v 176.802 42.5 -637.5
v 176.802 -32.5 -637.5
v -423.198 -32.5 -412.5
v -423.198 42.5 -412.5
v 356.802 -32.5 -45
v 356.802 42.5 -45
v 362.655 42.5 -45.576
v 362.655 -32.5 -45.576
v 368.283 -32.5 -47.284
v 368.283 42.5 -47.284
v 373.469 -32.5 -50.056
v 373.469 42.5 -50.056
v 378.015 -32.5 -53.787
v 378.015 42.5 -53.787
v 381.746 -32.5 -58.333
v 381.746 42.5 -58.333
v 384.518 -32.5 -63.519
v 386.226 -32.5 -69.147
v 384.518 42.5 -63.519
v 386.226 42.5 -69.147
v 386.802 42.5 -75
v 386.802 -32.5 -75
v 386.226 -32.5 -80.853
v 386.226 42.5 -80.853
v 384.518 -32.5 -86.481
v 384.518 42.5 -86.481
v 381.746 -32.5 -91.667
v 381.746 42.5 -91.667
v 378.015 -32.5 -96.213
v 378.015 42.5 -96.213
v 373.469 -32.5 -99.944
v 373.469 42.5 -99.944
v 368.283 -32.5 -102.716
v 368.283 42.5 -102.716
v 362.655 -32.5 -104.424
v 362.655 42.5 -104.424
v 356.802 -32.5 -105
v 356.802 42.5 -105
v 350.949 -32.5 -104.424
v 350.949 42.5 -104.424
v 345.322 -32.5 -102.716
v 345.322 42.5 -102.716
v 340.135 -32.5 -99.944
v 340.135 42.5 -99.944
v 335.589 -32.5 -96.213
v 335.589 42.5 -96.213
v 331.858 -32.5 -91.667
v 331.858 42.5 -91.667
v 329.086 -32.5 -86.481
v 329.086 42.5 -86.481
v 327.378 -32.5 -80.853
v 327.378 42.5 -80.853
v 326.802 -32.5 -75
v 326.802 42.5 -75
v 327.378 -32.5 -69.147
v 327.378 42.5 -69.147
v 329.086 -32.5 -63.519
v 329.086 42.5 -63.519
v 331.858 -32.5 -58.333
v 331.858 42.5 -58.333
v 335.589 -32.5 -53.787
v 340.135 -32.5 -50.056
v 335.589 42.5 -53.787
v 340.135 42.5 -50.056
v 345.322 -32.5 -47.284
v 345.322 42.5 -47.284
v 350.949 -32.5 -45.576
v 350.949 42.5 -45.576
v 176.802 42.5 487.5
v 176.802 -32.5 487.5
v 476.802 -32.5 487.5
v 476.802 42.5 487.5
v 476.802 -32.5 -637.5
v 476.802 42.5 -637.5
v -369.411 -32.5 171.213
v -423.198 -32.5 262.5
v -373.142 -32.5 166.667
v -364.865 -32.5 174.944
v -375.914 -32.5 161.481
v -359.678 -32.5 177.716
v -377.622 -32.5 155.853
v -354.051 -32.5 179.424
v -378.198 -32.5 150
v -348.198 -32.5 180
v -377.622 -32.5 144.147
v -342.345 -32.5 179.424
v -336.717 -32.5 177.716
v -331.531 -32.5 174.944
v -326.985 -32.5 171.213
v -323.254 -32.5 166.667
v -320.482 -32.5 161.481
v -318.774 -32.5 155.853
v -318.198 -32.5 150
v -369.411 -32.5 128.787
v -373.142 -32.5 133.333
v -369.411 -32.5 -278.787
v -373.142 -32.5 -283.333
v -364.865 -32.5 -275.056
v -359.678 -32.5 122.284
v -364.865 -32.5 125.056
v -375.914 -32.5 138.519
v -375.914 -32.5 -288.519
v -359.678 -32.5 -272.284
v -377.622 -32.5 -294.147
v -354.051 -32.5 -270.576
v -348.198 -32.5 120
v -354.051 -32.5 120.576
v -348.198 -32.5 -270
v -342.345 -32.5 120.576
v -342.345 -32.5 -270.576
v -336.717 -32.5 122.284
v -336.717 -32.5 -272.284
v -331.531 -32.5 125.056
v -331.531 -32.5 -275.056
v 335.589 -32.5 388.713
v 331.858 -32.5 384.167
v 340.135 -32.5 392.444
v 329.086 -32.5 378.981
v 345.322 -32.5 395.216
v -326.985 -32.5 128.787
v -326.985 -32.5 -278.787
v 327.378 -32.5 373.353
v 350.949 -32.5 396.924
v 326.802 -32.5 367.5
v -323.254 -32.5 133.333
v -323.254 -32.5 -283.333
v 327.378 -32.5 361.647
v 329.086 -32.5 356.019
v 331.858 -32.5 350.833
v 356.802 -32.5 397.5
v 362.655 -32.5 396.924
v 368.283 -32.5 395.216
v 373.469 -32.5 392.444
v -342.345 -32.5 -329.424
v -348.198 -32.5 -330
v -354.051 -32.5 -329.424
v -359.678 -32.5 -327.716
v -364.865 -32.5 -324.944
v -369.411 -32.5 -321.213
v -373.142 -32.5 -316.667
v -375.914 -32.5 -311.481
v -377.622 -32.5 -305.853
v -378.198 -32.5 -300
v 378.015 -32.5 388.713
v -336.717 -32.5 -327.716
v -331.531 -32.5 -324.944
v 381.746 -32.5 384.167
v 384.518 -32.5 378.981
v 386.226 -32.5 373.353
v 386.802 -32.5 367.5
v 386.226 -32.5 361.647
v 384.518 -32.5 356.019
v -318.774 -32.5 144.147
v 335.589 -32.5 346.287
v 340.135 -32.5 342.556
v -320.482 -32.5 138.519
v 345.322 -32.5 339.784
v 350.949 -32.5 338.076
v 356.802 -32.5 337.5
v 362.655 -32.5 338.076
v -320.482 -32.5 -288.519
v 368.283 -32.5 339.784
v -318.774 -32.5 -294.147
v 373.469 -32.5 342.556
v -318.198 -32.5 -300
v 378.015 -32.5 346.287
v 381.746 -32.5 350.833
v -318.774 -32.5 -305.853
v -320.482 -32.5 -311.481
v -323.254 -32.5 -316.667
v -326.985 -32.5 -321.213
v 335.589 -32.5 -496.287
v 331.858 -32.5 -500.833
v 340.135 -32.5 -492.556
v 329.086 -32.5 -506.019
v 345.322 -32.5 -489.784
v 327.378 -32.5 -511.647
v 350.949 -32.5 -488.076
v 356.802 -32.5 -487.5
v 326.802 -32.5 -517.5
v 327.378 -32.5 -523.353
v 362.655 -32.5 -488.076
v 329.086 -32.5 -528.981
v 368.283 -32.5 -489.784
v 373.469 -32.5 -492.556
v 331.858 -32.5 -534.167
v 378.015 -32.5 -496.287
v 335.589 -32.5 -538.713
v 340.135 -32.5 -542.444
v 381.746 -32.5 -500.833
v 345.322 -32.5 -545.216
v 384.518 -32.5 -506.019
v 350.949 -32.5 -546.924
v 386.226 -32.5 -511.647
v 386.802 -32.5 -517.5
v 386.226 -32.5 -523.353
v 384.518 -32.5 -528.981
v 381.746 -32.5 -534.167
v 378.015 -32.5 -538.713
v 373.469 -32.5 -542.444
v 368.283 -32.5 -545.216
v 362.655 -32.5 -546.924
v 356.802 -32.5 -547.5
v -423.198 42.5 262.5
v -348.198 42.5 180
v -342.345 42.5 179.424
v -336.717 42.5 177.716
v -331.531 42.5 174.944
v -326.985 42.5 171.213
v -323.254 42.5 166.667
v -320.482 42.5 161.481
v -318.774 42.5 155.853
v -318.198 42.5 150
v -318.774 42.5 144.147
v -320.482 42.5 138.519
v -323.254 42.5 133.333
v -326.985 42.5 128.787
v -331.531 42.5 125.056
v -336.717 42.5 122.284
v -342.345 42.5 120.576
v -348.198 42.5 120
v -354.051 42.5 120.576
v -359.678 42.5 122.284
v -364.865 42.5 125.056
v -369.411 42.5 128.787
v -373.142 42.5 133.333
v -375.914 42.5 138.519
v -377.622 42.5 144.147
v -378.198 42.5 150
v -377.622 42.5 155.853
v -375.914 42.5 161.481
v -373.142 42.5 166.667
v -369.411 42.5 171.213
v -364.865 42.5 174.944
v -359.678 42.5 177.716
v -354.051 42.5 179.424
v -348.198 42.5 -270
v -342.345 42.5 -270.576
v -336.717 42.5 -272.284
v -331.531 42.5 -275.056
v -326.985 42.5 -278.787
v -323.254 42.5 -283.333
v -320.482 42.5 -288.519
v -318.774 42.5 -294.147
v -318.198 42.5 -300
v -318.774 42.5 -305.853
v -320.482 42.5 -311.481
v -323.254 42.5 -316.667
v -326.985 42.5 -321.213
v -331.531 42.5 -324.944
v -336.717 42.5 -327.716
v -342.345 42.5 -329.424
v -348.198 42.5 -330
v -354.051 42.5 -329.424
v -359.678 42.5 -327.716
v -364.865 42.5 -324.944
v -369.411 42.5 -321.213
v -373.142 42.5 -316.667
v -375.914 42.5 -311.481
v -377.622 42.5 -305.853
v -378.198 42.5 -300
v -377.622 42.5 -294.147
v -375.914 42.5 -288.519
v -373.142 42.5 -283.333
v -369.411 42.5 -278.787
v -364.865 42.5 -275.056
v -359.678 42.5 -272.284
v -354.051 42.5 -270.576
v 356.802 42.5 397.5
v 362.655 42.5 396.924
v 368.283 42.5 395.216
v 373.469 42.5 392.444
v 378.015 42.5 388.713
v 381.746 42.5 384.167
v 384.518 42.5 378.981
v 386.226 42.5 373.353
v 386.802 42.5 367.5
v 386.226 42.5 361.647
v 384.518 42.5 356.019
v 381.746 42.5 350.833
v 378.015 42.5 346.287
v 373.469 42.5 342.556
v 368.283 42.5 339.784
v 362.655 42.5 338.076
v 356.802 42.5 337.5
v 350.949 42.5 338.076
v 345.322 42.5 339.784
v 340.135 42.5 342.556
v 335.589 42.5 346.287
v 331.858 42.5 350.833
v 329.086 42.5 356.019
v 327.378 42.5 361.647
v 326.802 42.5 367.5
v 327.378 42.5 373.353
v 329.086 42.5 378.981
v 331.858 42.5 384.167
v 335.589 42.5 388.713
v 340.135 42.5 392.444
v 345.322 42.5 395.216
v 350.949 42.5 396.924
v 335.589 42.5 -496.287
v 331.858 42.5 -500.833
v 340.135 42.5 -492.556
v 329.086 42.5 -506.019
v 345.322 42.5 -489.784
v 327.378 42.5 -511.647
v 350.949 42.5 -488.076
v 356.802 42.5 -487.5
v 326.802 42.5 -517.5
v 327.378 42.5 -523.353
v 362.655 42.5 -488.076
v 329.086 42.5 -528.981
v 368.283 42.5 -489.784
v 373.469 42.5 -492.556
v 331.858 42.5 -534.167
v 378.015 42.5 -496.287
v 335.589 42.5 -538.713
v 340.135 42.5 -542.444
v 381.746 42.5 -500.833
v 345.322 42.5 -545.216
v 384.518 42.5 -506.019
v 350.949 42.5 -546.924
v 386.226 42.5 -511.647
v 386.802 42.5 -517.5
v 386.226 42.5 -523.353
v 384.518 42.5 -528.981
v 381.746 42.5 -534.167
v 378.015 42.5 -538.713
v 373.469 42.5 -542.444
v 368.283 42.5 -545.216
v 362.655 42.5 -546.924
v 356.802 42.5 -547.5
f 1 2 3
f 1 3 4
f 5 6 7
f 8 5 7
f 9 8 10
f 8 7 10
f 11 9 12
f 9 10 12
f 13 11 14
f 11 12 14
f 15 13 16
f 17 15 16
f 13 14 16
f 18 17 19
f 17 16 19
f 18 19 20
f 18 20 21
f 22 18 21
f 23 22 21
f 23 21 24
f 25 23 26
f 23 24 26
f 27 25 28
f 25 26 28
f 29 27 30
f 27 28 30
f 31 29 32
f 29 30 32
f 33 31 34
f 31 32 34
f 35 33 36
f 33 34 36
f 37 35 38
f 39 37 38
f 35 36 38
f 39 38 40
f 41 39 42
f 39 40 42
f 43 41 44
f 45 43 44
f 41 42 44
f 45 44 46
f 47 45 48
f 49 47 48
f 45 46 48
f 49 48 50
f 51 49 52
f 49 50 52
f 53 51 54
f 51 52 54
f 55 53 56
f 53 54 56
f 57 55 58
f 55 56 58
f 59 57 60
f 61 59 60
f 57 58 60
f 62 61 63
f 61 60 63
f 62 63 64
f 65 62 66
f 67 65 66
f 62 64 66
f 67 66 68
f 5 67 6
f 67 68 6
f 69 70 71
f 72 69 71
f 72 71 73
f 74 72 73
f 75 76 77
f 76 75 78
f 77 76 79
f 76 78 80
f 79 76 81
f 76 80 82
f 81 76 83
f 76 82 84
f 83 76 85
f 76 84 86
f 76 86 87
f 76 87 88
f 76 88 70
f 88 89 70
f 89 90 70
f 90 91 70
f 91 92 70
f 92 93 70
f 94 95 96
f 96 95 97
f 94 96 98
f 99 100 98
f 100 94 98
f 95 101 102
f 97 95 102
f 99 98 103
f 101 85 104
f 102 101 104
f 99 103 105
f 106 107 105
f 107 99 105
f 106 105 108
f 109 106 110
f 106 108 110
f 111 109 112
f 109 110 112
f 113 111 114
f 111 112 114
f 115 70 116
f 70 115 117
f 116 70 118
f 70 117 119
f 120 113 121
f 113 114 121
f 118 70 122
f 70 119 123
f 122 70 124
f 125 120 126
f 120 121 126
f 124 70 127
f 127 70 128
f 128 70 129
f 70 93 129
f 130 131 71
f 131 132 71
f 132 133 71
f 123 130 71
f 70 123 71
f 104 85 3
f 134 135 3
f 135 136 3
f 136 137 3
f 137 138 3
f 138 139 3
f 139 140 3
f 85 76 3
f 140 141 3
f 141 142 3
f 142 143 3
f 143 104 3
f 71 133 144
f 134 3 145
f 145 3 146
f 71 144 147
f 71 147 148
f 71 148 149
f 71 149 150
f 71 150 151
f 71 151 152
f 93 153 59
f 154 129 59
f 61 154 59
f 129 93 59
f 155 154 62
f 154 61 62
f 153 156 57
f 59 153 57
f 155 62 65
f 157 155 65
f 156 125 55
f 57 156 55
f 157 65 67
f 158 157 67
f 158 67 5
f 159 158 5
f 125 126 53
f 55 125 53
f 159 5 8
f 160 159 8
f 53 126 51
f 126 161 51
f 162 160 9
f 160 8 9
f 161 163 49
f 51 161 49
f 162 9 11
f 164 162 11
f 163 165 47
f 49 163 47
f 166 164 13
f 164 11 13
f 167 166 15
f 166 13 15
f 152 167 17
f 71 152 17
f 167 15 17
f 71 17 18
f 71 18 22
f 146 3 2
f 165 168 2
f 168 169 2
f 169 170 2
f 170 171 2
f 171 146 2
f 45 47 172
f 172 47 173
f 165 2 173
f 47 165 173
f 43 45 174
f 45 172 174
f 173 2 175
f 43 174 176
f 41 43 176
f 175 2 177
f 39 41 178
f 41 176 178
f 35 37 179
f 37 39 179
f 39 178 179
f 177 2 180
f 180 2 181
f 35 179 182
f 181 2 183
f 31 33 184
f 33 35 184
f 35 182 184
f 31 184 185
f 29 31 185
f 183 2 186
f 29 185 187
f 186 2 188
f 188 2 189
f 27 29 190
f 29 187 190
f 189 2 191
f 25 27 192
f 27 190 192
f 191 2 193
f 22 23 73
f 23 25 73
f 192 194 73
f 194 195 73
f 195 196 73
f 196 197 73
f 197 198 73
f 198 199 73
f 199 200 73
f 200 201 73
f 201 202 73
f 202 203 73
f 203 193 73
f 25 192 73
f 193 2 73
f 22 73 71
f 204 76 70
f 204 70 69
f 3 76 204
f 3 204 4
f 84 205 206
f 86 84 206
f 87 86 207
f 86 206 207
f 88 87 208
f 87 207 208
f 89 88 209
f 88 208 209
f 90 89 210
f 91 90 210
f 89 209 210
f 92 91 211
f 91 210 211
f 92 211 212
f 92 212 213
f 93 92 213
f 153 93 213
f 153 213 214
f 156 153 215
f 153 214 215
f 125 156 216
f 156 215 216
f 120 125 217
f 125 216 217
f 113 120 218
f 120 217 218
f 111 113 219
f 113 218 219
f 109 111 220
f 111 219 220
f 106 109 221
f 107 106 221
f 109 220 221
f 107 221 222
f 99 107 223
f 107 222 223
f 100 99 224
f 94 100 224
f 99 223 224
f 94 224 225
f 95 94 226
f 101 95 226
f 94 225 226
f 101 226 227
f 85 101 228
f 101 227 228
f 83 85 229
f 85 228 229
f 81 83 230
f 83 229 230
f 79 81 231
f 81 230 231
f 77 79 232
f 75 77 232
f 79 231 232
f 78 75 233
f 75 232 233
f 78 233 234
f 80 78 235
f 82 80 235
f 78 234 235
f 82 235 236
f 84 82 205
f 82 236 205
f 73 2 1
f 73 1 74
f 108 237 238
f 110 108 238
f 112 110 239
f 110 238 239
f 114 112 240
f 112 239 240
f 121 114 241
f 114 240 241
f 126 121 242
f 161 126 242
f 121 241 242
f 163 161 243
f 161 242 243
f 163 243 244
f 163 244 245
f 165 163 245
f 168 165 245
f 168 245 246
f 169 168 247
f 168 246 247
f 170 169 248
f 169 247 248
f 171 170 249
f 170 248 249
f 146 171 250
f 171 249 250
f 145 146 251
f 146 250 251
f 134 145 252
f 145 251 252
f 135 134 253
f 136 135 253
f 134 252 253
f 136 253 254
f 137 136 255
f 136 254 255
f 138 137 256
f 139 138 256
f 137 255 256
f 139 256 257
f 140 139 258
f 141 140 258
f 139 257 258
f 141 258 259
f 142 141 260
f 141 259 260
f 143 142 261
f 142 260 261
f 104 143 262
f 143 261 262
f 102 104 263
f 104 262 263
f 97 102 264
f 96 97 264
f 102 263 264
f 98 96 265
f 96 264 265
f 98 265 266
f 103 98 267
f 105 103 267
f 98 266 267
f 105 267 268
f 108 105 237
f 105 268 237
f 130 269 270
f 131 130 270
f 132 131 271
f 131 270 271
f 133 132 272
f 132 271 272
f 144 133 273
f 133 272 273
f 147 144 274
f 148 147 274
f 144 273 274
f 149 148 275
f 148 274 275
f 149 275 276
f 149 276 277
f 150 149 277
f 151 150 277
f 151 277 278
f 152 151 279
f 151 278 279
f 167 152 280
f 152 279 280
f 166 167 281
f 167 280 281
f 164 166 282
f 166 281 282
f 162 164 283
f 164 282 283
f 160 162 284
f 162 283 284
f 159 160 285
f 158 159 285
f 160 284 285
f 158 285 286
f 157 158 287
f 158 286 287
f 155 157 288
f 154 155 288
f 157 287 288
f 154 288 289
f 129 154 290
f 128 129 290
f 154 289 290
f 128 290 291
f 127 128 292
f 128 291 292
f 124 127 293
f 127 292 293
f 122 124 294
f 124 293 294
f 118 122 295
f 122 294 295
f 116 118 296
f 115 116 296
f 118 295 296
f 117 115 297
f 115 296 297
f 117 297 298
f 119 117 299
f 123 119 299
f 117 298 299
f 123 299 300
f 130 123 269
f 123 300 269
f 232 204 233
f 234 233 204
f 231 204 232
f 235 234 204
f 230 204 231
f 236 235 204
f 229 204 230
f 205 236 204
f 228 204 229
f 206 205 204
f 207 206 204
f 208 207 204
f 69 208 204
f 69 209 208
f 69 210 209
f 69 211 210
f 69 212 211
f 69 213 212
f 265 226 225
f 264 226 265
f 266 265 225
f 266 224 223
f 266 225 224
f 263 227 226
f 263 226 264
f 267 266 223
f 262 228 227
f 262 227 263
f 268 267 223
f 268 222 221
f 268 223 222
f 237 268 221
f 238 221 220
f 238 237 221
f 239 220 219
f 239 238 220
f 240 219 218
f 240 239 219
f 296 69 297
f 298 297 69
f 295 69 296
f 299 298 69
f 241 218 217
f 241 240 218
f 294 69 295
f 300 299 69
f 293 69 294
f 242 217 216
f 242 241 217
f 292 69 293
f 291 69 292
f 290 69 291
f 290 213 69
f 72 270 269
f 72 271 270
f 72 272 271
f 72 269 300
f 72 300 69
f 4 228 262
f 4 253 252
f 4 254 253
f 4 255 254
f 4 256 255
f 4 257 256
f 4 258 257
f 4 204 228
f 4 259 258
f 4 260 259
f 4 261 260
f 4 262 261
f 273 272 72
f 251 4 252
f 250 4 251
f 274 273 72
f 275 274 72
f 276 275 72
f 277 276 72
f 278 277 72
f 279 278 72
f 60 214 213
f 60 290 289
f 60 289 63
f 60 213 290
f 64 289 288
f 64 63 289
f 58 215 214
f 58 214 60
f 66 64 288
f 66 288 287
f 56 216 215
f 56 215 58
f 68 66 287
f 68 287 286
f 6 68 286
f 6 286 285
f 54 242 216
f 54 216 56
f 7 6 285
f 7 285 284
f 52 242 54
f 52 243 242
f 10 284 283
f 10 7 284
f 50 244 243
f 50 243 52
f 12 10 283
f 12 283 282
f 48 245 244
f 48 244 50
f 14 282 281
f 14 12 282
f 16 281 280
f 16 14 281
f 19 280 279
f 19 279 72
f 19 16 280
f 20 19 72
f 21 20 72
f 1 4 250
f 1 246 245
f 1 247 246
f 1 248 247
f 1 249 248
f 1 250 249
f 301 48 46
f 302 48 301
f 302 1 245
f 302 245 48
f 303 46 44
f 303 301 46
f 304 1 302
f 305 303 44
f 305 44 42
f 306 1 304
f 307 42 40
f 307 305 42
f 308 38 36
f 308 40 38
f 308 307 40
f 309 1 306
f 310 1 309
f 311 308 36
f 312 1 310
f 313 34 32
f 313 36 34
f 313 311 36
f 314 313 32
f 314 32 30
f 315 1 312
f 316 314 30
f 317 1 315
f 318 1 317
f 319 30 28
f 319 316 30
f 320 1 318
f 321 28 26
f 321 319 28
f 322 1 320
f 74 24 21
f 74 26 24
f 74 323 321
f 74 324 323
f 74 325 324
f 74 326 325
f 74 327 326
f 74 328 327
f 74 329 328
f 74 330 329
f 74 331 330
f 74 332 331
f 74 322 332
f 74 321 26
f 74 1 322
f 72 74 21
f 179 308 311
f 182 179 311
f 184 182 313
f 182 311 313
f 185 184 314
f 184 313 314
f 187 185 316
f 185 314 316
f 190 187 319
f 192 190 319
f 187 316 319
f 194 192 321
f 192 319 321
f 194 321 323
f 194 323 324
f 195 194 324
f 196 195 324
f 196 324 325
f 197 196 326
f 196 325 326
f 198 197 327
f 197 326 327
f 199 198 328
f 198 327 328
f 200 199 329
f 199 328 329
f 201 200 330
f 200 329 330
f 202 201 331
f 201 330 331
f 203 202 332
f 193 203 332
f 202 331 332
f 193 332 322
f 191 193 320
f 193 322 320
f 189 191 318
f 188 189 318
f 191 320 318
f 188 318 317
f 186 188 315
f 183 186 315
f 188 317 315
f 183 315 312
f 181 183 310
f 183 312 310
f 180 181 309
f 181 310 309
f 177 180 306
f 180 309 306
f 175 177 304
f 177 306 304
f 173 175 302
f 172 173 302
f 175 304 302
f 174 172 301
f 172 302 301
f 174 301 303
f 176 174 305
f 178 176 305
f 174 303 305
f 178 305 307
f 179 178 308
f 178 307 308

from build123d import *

# Parameters (mm, degrees)
BOSS_EXTRUDE1_OUTLINE_W = 120
BOSS_EXTRUDE1_OUTLINE_H = 150
BOSS_EXTRUDE1_DEPTH     = 10
CHAMFER1_SIZE           = 30
CHAMFER1_SIZE2          = 80
CHAMFER2_SIZE           = 80
CHAMFER2_SIZE2          = 30
SKETCH2_R               = 4
CUT_EXTRUDE1_DEPTH      = 10
SCALE1_SCALE            = 7.5


# Read off the part's stored shape, not the designer's step: Boss-Extrude1
with BuildPart() as part:
    # Boss-Extrude1 outline → Boss-Extrude1 (new body)
    with BuildSketch(Plane(origin=(0, 0, 0), x_dir=(1, 0, 0), z_dir=(0, 1, 0))):
        with Locations((60, 75)):
            Rectangle(BOSS_EXTRUDE1_OUTLINE_W, BOSS_EXTRUDE1_OUTLINE_H)
    extrude(amount=BOSS_EXTRUDE1_DEPTH)

    # Chamfer1
    chamfer1_edges = [part.edges().sort_by_distance(p)[0] for p in [
        (0, 5, 0),
    ]]
    chamfer1_side = [part.faces().sort_by_distance(p)[0] for p in [
        (0, 5, -75),
    ]]
    chamfer(chamfer1_edges, length=CHAMFER1_SIZE, length2=CHAMFER1_SIZE2, reference=chamfer1_side[0])

    # Chamfer2
    chamfer2_edges = [part.edges().sort_by_distance(p)[0] for p in [
        (0, 5, -150),
    ]]
    chamfer2_side = [part.faces().sort_by_distance(p)[0] for p in [
        (60, 5, -150),
    ]]
    chamfer(chamfer2_edges, length=CHAMFER2_SIZE, length2=CHAMFER2_SIZE2, reference=chamfer2_side[0])

    # Sketch2 → Cut-Extrude1 (cut)
    with BuildSketch(Plane(origin=(0, 10, 0), x_dir=(1, 0, 0), z_dir=(0, 1, 0))):
        with Locations(Location((104, 134, 0), (0, 0, 270))):
            Circle(SKETCH2_R)
        with Locations(Location((104, 16, 0), (0, 0, 270))):
            Circle(SKETCH2_R)
        with Locations(Location((10, 105, 0), (0, 0, 270))):
            Circle(SKETCH2_R)
        with Locations(Location((10, 45, 0), (0, 0, 270))):
            Circle(SKETCH2_R)
        with Locations(Location((104, 75, 0), (0, 0, 270))):
            Circle(SKETCH2_R)
    extrude(amount=-CUT_EXTRUDE1_DEPTH, mode=Mode.SUBTRACT)


with BuildPart() as part_1:
    # Scale1: scaled about (65.107380076, 5, -75)
    add(part.part.scale(SCALE1_SCALE).moved(Location((-423.197970494, -32.5, 487.5))))


solid = part_1.part
